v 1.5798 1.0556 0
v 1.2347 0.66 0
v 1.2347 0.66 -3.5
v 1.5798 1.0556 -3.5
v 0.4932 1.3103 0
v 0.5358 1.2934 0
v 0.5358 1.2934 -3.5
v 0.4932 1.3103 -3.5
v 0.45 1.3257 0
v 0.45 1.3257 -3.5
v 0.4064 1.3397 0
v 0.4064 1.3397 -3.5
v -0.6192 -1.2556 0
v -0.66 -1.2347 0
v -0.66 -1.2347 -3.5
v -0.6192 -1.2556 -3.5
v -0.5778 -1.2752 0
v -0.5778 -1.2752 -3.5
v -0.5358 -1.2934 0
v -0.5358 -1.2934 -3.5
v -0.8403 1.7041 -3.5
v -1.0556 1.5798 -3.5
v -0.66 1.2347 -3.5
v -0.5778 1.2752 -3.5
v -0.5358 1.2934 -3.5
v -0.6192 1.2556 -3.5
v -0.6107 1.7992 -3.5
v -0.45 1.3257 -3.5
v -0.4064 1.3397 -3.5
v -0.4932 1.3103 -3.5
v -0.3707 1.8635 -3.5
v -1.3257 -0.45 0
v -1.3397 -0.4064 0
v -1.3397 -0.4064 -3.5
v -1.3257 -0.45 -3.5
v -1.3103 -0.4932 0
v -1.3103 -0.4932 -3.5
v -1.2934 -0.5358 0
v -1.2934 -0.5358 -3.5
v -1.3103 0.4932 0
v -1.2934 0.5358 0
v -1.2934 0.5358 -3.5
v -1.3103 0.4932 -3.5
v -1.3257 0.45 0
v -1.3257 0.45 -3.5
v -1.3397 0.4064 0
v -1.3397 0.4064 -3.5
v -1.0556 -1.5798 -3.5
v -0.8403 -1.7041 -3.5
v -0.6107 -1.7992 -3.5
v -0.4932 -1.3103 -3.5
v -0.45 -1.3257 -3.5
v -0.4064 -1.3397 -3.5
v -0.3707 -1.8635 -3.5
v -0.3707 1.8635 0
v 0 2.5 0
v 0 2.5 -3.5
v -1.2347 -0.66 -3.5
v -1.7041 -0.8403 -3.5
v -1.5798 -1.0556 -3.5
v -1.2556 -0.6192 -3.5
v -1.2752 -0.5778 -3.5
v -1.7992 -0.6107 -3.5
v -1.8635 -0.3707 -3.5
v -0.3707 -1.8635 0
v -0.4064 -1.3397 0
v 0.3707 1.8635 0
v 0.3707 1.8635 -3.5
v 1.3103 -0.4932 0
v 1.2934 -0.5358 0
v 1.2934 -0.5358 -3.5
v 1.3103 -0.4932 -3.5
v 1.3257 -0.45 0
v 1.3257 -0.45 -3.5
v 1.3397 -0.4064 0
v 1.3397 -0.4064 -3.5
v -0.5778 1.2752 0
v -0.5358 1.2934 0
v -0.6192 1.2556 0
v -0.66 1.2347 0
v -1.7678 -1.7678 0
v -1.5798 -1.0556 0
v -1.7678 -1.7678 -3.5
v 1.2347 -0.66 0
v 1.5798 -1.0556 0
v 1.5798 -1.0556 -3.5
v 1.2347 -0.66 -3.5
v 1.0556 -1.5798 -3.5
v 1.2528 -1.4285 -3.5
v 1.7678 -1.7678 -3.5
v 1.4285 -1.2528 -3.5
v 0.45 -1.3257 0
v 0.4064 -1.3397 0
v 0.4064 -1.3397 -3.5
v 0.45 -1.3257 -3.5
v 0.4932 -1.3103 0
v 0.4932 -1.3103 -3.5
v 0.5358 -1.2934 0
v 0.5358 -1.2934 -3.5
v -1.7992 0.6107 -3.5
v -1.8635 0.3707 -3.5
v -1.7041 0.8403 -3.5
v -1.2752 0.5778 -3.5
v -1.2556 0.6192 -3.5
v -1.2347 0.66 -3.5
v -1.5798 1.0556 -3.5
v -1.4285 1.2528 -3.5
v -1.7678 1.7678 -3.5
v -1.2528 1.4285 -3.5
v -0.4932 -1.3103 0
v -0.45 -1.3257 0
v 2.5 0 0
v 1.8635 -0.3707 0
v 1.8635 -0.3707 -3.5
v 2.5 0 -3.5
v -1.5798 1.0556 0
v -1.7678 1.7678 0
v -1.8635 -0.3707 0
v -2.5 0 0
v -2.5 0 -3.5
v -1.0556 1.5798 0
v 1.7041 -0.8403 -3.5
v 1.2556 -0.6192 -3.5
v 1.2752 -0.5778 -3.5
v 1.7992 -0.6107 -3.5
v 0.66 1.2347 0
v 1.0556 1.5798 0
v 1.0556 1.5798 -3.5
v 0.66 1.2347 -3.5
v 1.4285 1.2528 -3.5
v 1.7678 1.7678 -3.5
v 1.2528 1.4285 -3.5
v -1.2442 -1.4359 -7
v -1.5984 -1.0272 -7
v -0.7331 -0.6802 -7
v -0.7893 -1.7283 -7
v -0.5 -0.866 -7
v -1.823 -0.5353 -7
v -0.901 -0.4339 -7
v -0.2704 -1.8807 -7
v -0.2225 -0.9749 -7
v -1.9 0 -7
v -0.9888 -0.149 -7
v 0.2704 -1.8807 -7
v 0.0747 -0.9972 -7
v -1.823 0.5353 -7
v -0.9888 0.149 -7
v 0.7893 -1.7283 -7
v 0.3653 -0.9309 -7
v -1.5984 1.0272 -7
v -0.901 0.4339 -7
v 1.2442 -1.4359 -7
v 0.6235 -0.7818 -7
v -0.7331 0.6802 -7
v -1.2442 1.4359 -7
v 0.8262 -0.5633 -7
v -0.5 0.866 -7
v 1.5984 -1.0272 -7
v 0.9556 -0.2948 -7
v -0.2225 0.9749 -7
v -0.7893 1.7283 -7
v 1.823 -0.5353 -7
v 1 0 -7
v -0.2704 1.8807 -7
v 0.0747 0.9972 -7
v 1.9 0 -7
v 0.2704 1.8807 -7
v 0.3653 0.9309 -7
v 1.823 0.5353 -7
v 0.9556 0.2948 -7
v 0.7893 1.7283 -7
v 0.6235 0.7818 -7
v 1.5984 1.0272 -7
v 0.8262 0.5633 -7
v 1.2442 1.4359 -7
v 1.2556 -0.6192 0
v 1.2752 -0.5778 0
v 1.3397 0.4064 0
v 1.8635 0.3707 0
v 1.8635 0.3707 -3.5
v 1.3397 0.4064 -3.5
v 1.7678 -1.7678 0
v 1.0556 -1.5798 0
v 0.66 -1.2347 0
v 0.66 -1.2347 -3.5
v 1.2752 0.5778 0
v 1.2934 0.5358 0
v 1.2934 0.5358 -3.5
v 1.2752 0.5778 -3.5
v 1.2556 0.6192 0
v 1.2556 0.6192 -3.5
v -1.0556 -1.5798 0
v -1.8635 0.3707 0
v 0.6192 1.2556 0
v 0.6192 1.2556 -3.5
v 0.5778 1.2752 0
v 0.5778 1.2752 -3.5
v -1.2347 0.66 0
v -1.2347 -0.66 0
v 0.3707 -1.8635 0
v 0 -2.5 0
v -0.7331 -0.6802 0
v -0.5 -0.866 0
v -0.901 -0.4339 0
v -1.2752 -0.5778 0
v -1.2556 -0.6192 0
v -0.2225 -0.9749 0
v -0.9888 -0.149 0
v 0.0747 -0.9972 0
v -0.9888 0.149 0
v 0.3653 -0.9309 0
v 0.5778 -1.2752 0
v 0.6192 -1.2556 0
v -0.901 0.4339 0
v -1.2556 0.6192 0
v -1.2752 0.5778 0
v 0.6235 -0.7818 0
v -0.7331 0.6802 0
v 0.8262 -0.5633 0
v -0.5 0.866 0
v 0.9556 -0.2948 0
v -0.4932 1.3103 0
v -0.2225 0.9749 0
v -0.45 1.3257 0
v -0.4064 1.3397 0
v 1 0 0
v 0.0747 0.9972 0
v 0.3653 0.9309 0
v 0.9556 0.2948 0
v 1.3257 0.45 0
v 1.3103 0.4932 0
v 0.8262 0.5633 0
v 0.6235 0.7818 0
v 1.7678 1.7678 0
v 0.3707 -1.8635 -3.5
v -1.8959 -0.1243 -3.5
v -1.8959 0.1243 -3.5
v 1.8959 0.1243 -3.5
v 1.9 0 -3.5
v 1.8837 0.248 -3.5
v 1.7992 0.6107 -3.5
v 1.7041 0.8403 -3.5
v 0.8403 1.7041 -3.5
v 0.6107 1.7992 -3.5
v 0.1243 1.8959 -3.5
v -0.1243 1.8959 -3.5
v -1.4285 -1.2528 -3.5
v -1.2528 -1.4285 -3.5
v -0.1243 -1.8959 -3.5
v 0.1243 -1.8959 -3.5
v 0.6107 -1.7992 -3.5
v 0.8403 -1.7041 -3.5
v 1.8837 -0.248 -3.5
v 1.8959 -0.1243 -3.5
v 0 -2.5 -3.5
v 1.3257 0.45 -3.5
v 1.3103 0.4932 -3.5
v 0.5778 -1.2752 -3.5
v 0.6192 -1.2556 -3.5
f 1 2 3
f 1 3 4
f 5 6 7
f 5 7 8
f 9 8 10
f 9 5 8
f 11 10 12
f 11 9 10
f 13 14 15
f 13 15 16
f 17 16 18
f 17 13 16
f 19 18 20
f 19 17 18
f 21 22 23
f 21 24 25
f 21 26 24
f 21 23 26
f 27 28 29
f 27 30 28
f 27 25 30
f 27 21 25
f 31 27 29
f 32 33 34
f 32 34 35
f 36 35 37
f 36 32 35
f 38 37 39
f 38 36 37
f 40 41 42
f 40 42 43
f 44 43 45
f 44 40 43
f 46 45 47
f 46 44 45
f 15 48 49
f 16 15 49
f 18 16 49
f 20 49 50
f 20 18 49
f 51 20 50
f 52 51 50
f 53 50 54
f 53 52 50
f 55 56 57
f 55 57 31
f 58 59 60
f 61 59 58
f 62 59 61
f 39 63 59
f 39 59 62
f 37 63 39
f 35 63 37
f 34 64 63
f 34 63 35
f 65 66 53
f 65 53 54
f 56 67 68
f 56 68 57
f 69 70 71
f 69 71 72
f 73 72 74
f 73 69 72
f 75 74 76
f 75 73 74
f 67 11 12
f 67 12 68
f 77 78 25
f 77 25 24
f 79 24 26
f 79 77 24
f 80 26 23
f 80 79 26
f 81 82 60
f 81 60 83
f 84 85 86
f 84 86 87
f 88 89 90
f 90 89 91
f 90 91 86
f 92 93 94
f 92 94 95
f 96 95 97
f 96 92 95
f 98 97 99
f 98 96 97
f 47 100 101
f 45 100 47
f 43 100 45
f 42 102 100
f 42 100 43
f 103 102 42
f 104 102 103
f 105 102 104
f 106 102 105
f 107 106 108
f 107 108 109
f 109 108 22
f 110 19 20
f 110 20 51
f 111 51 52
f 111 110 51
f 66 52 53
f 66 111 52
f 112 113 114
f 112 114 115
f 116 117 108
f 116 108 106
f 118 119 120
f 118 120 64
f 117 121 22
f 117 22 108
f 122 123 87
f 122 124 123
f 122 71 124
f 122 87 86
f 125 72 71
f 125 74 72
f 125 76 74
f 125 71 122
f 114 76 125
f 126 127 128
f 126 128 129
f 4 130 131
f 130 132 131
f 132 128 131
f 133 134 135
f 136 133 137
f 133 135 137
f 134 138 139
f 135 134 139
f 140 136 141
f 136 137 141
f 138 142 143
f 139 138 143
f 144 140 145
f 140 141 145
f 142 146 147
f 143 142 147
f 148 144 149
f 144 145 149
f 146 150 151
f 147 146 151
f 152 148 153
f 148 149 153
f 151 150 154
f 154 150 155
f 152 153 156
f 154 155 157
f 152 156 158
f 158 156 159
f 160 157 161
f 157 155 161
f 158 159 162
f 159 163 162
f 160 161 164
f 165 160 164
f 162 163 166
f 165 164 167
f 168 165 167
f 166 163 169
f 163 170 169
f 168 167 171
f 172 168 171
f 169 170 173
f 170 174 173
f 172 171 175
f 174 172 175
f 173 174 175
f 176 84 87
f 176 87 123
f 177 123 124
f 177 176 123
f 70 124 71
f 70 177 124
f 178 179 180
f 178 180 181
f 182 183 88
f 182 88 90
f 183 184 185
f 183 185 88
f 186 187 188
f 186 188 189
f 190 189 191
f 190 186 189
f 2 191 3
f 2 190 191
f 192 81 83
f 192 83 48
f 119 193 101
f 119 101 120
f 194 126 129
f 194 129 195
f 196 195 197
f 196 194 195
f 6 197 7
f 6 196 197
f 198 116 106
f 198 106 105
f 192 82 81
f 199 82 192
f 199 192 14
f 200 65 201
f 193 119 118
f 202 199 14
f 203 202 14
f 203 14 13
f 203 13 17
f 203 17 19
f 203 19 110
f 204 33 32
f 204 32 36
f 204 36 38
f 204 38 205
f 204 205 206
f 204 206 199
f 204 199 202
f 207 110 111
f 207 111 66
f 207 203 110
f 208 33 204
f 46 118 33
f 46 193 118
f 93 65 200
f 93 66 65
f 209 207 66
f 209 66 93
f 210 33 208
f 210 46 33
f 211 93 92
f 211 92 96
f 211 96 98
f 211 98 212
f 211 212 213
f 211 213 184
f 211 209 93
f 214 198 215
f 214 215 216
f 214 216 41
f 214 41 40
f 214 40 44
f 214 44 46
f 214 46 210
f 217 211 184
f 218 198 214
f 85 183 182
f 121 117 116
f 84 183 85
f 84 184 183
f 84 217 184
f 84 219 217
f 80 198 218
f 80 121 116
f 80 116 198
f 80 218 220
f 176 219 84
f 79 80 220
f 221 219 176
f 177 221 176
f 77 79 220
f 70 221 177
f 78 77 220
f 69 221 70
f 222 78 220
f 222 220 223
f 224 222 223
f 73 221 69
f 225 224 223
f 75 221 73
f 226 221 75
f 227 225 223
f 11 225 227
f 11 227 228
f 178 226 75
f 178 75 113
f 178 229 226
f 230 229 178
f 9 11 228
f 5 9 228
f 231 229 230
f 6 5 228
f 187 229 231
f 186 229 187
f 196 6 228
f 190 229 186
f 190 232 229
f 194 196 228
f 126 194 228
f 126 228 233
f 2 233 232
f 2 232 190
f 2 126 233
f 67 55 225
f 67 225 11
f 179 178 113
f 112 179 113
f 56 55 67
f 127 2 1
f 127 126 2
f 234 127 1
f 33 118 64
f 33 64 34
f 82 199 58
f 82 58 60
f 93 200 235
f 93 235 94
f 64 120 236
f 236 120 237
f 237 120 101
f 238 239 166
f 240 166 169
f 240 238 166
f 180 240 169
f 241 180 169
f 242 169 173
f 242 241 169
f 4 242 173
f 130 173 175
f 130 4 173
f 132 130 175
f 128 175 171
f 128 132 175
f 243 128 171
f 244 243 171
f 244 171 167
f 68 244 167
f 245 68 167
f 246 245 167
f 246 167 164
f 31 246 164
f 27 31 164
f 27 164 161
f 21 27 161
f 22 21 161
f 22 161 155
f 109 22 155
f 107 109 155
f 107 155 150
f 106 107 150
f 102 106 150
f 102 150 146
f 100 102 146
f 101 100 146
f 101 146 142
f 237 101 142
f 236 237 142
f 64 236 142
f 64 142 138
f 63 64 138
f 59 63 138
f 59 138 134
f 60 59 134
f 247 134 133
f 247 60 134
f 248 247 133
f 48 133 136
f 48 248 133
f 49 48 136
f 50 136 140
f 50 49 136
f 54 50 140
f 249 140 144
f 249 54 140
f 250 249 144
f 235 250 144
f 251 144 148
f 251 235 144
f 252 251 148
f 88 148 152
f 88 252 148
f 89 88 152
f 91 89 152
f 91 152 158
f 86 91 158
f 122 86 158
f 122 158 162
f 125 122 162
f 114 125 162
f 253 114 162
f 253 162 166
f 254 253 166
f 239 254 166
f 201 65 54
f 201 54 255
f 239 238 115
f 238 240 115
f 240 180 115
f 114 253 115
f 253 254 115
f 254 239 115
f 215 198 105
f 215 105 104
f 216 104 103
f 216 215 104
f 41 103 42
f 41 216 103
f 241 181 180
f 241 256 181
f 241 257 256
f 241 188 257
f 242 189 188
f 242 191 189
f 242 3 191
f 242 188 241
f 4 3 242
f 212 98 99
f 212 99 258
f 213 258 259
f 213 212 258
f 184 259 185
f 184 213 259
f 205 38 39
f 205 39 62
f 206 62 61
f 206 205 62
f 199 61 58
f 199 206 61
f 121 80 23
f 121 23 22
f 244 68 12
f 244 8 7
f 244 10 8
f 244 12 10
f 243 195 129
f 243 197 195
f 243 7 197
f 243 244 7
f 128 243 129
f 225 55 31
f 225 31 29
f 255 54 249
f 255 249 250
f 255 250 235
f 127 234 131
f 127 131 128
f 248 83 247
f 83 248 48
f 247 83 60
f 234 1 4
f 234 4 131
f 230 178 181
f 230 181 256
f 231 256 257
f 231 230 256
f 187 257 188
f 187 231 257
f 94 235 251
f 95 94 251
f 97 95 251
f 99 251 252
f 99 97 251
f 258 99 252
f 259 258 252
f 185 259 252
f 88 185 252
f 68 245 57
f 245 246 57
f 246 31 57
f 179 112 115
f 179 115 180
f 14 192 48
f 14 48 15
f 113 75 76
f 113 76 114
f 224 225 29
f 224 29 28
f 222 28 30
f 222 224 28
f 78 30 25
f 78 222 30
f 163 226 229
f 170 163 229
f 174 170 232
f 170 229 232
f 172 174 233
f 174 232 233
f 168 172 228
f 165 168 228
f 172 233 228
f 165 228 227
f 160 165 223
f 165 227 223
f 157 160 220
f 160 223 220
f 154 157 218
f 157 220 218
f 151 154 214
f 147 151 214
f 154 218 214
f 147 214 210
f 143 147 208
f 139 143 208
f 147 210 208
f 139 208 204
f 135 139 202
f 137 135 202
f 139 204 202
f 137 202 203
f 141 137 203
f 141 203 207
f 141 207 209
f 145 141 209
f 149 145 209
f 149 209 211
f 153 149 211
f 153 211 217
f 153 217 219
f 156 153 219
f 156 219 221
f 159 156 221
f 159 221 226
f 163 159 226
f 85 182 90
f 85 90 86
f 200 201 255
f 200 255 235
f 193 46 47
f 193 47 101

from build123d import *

# Parameters (mm, degrees)
SKETCH1_R           = 1.9
SKETCH1_R_2         = 1
BOSS_EXTRUDE1_DEPTH = 7
SKETCH2_R           = 1.9
SKETCH2_R_2         = 1.4
CUT_EXTRUDE1_DEPTH  = 3.5
SKETCH3_R           = 1
BOSS_EXTRUDE2_DEPTH = 3.5


with BuildPart() as part:
    # Sketch1 → Boss-Extrude1 (new body)
    with BuildSketch(Plane.XY):
        Circle(SKETCH1_R)
        Circle(SKETCH1_R_2, mode=Mode.SUBTRACT)
    extrude(amount=-BOSS_EXTRUDE1_DEPTH)

    # Sketch2 → Cut-Extrude1 (cut)
    with BuildSketch(Plane.XY):
        Circle(SKETCH2_R)
        Circle(SKETCH2_R_2, mode=Mode.SUBTRACT)
    extrude(amount=-CUT_EXTRUDE1_DEPTH, mode=Mode.SUBTRACT)

    # Sketch3 → Boss-Extrude2 (add)
    with BuildSketch(Plane.XY):
        with BuildLine():
            Line((1.579792263, 1.055583443), (1.767766953, 1.767766953))
            Line((1.767766953, 1.767766953), (1.055583443, 1.579792263))
            Line((1.055583443, 1.579792263), (0.659955432, 1.23468977))
            ThreePointArc((0.659955432, 1.23468977), (0.598577131, 1.26558501), (0.535756805, 1.293431346))
            ThreePointArc((0.535756805, 1.293431346), (0.471645795, 1.318161691), (0.406398548, 1.33971647))
            Line((0.406398548, 1.33971647), (0.370671612, 1.863492033))
            Line((0.370671612, 1.863492033), (0, 2.5))
            Line((0, 2.5), (-0.370671612, 1.863492033))
            Line((-0.370671612, 1.863492033), (-0.406398548, 1.33971647))
            ThreePointArc((-0.406398548, 1.33971647), (-0.471645795, 1.318161691), (-0.535756805, 1.293431346))
            ThreePointArc((-0.535756805, 1.293431346), (-0.598577131, 1.26558501), (-0.659955432, 1.23468977))
            Line((-0.659955432, 1.23468977), (-1.055583443, 1.579792263))
            Line((-1.055583443, 1.579792263), (-1.767766953, 1.767766953))
            Line((-1.767766953, 1.767766953), (-1.579792263, 1.055583443))
            Line((-1.579792263, 1.055583443), (-1.23468977, 0.659955432))
            ThreePointArc((-1.23468977, 0.659955432), (-1.26558501, 0.598577131), (-1.293431346, 0.535756805))
            ThreePointArc((-1.293431346, 0.535756805), (-1.318161691, 0.471645795), (-1.33971647, 0.406398548))
            Line((-1.33971647, 0.406398548), (-1.863492033, 0.370671612))
            Line((-1.863492033, 0.370671612), (-2.5, 0))
            Line((-2.5, 0), (-1.863492033, -0.370671612))
            Line((-1.863492033, -0.370671612), (-1.33971647, -0.406398548))
            ThreePointArc((-1.33971647, -0.406398548), (-1.318161691, -0.471645795), (-1.293431346, -0.535756805))
            ThreePointArc((-1.293431346, -0.535756805), (-1.26558501, -0.598577131), (-1.23468977, -0.659955432))
            Line((-1.23468977, -0.659955432), (-1.579792263, -1.055583443))
            Line((-1.579792263, -1.055583443), (-1.767766953, -1.767766953))
            Line((-1.767766953, -1.767766953), (-1.055583443, -1.579792263))
            Line((-1.055583443, -1.579792263), (-0.659955432, -1.23468977))
            ThreePointArc((-0.659955432, -1.23468977), (-0.598577131, -1.26558501), (-0.535756805, -1.293431346))
            ThreePointArc((-0.535756805, -1.293431346), (-0.471645795, -1.318161691), (-0.406398548, -1.33971647))
            Line((-0.406398548, -1.33971647), (-0.370671612, -1.863492033))
            Line((-0.370671612, -1.863492033), (0, -2.5))
            Line((0, -2.5), (0.370671612, -1.863492033))
            Line((0.370671612, -1.863492033), (0.406398548, -1.33971647))
            ThreePointArc((0.406398548, -1.33971647), (0.471645795, -1.318161691), (0.535756805, -1.293431346))
            ThreePointArc((0.535756805, -1.293431346), (0.598577131, -1.26558501), (0.659955432, -1.23468977))
            Line((0.659955432, -1.23468977), (1.055583443, -1.579792263))
            Line((1.055583443, -1.579792263), (1.767766953, -1.767766953))
            Line((1.767766953, -1.767766953), (1.579792263, -1.055583443))
            Line((1.579792263, -1.055583443), (1.23468977, -0.659955432))
            ThreePointArc((1.23468977, -0.659955432), (1.26558501, -0.598577131), (1.293431346, -0.535756805))
            ThreePointArc((1.293431346, -0.535756805), (1.318161691, -0.471645795), (1.33971647, -0.406398548))
            Line((1.33971647, -0.406398548), (1.863492033, -0.370671612))
            Line((1.863492033, -0.370671612), (2.5, 0))
            Line((2.5, 0), (1.863492033, 0.370671612))
            Line((1.863492033, 0.370671612), (1.33971647, 0.406398548))
            ThreePointArc((1.33971647, 0.406398548), (1.318161691, 0.471645795), (1.293431346, 0.535756805))
            ThreePointArc((1.293431346, 0.535756805), (1.26558501, 0.598577131), (1.23468977, 0.659955432))
            Line((1.23468977, 0.659955432), (1.579792263, 1.055583443))
        make_face()
        Circle(SKETCH3_R, mode=Mode.SUBTRACT)
    extrude(amount=-BOSS_EXTRUDE2_DEPTH)


solid = part.part
